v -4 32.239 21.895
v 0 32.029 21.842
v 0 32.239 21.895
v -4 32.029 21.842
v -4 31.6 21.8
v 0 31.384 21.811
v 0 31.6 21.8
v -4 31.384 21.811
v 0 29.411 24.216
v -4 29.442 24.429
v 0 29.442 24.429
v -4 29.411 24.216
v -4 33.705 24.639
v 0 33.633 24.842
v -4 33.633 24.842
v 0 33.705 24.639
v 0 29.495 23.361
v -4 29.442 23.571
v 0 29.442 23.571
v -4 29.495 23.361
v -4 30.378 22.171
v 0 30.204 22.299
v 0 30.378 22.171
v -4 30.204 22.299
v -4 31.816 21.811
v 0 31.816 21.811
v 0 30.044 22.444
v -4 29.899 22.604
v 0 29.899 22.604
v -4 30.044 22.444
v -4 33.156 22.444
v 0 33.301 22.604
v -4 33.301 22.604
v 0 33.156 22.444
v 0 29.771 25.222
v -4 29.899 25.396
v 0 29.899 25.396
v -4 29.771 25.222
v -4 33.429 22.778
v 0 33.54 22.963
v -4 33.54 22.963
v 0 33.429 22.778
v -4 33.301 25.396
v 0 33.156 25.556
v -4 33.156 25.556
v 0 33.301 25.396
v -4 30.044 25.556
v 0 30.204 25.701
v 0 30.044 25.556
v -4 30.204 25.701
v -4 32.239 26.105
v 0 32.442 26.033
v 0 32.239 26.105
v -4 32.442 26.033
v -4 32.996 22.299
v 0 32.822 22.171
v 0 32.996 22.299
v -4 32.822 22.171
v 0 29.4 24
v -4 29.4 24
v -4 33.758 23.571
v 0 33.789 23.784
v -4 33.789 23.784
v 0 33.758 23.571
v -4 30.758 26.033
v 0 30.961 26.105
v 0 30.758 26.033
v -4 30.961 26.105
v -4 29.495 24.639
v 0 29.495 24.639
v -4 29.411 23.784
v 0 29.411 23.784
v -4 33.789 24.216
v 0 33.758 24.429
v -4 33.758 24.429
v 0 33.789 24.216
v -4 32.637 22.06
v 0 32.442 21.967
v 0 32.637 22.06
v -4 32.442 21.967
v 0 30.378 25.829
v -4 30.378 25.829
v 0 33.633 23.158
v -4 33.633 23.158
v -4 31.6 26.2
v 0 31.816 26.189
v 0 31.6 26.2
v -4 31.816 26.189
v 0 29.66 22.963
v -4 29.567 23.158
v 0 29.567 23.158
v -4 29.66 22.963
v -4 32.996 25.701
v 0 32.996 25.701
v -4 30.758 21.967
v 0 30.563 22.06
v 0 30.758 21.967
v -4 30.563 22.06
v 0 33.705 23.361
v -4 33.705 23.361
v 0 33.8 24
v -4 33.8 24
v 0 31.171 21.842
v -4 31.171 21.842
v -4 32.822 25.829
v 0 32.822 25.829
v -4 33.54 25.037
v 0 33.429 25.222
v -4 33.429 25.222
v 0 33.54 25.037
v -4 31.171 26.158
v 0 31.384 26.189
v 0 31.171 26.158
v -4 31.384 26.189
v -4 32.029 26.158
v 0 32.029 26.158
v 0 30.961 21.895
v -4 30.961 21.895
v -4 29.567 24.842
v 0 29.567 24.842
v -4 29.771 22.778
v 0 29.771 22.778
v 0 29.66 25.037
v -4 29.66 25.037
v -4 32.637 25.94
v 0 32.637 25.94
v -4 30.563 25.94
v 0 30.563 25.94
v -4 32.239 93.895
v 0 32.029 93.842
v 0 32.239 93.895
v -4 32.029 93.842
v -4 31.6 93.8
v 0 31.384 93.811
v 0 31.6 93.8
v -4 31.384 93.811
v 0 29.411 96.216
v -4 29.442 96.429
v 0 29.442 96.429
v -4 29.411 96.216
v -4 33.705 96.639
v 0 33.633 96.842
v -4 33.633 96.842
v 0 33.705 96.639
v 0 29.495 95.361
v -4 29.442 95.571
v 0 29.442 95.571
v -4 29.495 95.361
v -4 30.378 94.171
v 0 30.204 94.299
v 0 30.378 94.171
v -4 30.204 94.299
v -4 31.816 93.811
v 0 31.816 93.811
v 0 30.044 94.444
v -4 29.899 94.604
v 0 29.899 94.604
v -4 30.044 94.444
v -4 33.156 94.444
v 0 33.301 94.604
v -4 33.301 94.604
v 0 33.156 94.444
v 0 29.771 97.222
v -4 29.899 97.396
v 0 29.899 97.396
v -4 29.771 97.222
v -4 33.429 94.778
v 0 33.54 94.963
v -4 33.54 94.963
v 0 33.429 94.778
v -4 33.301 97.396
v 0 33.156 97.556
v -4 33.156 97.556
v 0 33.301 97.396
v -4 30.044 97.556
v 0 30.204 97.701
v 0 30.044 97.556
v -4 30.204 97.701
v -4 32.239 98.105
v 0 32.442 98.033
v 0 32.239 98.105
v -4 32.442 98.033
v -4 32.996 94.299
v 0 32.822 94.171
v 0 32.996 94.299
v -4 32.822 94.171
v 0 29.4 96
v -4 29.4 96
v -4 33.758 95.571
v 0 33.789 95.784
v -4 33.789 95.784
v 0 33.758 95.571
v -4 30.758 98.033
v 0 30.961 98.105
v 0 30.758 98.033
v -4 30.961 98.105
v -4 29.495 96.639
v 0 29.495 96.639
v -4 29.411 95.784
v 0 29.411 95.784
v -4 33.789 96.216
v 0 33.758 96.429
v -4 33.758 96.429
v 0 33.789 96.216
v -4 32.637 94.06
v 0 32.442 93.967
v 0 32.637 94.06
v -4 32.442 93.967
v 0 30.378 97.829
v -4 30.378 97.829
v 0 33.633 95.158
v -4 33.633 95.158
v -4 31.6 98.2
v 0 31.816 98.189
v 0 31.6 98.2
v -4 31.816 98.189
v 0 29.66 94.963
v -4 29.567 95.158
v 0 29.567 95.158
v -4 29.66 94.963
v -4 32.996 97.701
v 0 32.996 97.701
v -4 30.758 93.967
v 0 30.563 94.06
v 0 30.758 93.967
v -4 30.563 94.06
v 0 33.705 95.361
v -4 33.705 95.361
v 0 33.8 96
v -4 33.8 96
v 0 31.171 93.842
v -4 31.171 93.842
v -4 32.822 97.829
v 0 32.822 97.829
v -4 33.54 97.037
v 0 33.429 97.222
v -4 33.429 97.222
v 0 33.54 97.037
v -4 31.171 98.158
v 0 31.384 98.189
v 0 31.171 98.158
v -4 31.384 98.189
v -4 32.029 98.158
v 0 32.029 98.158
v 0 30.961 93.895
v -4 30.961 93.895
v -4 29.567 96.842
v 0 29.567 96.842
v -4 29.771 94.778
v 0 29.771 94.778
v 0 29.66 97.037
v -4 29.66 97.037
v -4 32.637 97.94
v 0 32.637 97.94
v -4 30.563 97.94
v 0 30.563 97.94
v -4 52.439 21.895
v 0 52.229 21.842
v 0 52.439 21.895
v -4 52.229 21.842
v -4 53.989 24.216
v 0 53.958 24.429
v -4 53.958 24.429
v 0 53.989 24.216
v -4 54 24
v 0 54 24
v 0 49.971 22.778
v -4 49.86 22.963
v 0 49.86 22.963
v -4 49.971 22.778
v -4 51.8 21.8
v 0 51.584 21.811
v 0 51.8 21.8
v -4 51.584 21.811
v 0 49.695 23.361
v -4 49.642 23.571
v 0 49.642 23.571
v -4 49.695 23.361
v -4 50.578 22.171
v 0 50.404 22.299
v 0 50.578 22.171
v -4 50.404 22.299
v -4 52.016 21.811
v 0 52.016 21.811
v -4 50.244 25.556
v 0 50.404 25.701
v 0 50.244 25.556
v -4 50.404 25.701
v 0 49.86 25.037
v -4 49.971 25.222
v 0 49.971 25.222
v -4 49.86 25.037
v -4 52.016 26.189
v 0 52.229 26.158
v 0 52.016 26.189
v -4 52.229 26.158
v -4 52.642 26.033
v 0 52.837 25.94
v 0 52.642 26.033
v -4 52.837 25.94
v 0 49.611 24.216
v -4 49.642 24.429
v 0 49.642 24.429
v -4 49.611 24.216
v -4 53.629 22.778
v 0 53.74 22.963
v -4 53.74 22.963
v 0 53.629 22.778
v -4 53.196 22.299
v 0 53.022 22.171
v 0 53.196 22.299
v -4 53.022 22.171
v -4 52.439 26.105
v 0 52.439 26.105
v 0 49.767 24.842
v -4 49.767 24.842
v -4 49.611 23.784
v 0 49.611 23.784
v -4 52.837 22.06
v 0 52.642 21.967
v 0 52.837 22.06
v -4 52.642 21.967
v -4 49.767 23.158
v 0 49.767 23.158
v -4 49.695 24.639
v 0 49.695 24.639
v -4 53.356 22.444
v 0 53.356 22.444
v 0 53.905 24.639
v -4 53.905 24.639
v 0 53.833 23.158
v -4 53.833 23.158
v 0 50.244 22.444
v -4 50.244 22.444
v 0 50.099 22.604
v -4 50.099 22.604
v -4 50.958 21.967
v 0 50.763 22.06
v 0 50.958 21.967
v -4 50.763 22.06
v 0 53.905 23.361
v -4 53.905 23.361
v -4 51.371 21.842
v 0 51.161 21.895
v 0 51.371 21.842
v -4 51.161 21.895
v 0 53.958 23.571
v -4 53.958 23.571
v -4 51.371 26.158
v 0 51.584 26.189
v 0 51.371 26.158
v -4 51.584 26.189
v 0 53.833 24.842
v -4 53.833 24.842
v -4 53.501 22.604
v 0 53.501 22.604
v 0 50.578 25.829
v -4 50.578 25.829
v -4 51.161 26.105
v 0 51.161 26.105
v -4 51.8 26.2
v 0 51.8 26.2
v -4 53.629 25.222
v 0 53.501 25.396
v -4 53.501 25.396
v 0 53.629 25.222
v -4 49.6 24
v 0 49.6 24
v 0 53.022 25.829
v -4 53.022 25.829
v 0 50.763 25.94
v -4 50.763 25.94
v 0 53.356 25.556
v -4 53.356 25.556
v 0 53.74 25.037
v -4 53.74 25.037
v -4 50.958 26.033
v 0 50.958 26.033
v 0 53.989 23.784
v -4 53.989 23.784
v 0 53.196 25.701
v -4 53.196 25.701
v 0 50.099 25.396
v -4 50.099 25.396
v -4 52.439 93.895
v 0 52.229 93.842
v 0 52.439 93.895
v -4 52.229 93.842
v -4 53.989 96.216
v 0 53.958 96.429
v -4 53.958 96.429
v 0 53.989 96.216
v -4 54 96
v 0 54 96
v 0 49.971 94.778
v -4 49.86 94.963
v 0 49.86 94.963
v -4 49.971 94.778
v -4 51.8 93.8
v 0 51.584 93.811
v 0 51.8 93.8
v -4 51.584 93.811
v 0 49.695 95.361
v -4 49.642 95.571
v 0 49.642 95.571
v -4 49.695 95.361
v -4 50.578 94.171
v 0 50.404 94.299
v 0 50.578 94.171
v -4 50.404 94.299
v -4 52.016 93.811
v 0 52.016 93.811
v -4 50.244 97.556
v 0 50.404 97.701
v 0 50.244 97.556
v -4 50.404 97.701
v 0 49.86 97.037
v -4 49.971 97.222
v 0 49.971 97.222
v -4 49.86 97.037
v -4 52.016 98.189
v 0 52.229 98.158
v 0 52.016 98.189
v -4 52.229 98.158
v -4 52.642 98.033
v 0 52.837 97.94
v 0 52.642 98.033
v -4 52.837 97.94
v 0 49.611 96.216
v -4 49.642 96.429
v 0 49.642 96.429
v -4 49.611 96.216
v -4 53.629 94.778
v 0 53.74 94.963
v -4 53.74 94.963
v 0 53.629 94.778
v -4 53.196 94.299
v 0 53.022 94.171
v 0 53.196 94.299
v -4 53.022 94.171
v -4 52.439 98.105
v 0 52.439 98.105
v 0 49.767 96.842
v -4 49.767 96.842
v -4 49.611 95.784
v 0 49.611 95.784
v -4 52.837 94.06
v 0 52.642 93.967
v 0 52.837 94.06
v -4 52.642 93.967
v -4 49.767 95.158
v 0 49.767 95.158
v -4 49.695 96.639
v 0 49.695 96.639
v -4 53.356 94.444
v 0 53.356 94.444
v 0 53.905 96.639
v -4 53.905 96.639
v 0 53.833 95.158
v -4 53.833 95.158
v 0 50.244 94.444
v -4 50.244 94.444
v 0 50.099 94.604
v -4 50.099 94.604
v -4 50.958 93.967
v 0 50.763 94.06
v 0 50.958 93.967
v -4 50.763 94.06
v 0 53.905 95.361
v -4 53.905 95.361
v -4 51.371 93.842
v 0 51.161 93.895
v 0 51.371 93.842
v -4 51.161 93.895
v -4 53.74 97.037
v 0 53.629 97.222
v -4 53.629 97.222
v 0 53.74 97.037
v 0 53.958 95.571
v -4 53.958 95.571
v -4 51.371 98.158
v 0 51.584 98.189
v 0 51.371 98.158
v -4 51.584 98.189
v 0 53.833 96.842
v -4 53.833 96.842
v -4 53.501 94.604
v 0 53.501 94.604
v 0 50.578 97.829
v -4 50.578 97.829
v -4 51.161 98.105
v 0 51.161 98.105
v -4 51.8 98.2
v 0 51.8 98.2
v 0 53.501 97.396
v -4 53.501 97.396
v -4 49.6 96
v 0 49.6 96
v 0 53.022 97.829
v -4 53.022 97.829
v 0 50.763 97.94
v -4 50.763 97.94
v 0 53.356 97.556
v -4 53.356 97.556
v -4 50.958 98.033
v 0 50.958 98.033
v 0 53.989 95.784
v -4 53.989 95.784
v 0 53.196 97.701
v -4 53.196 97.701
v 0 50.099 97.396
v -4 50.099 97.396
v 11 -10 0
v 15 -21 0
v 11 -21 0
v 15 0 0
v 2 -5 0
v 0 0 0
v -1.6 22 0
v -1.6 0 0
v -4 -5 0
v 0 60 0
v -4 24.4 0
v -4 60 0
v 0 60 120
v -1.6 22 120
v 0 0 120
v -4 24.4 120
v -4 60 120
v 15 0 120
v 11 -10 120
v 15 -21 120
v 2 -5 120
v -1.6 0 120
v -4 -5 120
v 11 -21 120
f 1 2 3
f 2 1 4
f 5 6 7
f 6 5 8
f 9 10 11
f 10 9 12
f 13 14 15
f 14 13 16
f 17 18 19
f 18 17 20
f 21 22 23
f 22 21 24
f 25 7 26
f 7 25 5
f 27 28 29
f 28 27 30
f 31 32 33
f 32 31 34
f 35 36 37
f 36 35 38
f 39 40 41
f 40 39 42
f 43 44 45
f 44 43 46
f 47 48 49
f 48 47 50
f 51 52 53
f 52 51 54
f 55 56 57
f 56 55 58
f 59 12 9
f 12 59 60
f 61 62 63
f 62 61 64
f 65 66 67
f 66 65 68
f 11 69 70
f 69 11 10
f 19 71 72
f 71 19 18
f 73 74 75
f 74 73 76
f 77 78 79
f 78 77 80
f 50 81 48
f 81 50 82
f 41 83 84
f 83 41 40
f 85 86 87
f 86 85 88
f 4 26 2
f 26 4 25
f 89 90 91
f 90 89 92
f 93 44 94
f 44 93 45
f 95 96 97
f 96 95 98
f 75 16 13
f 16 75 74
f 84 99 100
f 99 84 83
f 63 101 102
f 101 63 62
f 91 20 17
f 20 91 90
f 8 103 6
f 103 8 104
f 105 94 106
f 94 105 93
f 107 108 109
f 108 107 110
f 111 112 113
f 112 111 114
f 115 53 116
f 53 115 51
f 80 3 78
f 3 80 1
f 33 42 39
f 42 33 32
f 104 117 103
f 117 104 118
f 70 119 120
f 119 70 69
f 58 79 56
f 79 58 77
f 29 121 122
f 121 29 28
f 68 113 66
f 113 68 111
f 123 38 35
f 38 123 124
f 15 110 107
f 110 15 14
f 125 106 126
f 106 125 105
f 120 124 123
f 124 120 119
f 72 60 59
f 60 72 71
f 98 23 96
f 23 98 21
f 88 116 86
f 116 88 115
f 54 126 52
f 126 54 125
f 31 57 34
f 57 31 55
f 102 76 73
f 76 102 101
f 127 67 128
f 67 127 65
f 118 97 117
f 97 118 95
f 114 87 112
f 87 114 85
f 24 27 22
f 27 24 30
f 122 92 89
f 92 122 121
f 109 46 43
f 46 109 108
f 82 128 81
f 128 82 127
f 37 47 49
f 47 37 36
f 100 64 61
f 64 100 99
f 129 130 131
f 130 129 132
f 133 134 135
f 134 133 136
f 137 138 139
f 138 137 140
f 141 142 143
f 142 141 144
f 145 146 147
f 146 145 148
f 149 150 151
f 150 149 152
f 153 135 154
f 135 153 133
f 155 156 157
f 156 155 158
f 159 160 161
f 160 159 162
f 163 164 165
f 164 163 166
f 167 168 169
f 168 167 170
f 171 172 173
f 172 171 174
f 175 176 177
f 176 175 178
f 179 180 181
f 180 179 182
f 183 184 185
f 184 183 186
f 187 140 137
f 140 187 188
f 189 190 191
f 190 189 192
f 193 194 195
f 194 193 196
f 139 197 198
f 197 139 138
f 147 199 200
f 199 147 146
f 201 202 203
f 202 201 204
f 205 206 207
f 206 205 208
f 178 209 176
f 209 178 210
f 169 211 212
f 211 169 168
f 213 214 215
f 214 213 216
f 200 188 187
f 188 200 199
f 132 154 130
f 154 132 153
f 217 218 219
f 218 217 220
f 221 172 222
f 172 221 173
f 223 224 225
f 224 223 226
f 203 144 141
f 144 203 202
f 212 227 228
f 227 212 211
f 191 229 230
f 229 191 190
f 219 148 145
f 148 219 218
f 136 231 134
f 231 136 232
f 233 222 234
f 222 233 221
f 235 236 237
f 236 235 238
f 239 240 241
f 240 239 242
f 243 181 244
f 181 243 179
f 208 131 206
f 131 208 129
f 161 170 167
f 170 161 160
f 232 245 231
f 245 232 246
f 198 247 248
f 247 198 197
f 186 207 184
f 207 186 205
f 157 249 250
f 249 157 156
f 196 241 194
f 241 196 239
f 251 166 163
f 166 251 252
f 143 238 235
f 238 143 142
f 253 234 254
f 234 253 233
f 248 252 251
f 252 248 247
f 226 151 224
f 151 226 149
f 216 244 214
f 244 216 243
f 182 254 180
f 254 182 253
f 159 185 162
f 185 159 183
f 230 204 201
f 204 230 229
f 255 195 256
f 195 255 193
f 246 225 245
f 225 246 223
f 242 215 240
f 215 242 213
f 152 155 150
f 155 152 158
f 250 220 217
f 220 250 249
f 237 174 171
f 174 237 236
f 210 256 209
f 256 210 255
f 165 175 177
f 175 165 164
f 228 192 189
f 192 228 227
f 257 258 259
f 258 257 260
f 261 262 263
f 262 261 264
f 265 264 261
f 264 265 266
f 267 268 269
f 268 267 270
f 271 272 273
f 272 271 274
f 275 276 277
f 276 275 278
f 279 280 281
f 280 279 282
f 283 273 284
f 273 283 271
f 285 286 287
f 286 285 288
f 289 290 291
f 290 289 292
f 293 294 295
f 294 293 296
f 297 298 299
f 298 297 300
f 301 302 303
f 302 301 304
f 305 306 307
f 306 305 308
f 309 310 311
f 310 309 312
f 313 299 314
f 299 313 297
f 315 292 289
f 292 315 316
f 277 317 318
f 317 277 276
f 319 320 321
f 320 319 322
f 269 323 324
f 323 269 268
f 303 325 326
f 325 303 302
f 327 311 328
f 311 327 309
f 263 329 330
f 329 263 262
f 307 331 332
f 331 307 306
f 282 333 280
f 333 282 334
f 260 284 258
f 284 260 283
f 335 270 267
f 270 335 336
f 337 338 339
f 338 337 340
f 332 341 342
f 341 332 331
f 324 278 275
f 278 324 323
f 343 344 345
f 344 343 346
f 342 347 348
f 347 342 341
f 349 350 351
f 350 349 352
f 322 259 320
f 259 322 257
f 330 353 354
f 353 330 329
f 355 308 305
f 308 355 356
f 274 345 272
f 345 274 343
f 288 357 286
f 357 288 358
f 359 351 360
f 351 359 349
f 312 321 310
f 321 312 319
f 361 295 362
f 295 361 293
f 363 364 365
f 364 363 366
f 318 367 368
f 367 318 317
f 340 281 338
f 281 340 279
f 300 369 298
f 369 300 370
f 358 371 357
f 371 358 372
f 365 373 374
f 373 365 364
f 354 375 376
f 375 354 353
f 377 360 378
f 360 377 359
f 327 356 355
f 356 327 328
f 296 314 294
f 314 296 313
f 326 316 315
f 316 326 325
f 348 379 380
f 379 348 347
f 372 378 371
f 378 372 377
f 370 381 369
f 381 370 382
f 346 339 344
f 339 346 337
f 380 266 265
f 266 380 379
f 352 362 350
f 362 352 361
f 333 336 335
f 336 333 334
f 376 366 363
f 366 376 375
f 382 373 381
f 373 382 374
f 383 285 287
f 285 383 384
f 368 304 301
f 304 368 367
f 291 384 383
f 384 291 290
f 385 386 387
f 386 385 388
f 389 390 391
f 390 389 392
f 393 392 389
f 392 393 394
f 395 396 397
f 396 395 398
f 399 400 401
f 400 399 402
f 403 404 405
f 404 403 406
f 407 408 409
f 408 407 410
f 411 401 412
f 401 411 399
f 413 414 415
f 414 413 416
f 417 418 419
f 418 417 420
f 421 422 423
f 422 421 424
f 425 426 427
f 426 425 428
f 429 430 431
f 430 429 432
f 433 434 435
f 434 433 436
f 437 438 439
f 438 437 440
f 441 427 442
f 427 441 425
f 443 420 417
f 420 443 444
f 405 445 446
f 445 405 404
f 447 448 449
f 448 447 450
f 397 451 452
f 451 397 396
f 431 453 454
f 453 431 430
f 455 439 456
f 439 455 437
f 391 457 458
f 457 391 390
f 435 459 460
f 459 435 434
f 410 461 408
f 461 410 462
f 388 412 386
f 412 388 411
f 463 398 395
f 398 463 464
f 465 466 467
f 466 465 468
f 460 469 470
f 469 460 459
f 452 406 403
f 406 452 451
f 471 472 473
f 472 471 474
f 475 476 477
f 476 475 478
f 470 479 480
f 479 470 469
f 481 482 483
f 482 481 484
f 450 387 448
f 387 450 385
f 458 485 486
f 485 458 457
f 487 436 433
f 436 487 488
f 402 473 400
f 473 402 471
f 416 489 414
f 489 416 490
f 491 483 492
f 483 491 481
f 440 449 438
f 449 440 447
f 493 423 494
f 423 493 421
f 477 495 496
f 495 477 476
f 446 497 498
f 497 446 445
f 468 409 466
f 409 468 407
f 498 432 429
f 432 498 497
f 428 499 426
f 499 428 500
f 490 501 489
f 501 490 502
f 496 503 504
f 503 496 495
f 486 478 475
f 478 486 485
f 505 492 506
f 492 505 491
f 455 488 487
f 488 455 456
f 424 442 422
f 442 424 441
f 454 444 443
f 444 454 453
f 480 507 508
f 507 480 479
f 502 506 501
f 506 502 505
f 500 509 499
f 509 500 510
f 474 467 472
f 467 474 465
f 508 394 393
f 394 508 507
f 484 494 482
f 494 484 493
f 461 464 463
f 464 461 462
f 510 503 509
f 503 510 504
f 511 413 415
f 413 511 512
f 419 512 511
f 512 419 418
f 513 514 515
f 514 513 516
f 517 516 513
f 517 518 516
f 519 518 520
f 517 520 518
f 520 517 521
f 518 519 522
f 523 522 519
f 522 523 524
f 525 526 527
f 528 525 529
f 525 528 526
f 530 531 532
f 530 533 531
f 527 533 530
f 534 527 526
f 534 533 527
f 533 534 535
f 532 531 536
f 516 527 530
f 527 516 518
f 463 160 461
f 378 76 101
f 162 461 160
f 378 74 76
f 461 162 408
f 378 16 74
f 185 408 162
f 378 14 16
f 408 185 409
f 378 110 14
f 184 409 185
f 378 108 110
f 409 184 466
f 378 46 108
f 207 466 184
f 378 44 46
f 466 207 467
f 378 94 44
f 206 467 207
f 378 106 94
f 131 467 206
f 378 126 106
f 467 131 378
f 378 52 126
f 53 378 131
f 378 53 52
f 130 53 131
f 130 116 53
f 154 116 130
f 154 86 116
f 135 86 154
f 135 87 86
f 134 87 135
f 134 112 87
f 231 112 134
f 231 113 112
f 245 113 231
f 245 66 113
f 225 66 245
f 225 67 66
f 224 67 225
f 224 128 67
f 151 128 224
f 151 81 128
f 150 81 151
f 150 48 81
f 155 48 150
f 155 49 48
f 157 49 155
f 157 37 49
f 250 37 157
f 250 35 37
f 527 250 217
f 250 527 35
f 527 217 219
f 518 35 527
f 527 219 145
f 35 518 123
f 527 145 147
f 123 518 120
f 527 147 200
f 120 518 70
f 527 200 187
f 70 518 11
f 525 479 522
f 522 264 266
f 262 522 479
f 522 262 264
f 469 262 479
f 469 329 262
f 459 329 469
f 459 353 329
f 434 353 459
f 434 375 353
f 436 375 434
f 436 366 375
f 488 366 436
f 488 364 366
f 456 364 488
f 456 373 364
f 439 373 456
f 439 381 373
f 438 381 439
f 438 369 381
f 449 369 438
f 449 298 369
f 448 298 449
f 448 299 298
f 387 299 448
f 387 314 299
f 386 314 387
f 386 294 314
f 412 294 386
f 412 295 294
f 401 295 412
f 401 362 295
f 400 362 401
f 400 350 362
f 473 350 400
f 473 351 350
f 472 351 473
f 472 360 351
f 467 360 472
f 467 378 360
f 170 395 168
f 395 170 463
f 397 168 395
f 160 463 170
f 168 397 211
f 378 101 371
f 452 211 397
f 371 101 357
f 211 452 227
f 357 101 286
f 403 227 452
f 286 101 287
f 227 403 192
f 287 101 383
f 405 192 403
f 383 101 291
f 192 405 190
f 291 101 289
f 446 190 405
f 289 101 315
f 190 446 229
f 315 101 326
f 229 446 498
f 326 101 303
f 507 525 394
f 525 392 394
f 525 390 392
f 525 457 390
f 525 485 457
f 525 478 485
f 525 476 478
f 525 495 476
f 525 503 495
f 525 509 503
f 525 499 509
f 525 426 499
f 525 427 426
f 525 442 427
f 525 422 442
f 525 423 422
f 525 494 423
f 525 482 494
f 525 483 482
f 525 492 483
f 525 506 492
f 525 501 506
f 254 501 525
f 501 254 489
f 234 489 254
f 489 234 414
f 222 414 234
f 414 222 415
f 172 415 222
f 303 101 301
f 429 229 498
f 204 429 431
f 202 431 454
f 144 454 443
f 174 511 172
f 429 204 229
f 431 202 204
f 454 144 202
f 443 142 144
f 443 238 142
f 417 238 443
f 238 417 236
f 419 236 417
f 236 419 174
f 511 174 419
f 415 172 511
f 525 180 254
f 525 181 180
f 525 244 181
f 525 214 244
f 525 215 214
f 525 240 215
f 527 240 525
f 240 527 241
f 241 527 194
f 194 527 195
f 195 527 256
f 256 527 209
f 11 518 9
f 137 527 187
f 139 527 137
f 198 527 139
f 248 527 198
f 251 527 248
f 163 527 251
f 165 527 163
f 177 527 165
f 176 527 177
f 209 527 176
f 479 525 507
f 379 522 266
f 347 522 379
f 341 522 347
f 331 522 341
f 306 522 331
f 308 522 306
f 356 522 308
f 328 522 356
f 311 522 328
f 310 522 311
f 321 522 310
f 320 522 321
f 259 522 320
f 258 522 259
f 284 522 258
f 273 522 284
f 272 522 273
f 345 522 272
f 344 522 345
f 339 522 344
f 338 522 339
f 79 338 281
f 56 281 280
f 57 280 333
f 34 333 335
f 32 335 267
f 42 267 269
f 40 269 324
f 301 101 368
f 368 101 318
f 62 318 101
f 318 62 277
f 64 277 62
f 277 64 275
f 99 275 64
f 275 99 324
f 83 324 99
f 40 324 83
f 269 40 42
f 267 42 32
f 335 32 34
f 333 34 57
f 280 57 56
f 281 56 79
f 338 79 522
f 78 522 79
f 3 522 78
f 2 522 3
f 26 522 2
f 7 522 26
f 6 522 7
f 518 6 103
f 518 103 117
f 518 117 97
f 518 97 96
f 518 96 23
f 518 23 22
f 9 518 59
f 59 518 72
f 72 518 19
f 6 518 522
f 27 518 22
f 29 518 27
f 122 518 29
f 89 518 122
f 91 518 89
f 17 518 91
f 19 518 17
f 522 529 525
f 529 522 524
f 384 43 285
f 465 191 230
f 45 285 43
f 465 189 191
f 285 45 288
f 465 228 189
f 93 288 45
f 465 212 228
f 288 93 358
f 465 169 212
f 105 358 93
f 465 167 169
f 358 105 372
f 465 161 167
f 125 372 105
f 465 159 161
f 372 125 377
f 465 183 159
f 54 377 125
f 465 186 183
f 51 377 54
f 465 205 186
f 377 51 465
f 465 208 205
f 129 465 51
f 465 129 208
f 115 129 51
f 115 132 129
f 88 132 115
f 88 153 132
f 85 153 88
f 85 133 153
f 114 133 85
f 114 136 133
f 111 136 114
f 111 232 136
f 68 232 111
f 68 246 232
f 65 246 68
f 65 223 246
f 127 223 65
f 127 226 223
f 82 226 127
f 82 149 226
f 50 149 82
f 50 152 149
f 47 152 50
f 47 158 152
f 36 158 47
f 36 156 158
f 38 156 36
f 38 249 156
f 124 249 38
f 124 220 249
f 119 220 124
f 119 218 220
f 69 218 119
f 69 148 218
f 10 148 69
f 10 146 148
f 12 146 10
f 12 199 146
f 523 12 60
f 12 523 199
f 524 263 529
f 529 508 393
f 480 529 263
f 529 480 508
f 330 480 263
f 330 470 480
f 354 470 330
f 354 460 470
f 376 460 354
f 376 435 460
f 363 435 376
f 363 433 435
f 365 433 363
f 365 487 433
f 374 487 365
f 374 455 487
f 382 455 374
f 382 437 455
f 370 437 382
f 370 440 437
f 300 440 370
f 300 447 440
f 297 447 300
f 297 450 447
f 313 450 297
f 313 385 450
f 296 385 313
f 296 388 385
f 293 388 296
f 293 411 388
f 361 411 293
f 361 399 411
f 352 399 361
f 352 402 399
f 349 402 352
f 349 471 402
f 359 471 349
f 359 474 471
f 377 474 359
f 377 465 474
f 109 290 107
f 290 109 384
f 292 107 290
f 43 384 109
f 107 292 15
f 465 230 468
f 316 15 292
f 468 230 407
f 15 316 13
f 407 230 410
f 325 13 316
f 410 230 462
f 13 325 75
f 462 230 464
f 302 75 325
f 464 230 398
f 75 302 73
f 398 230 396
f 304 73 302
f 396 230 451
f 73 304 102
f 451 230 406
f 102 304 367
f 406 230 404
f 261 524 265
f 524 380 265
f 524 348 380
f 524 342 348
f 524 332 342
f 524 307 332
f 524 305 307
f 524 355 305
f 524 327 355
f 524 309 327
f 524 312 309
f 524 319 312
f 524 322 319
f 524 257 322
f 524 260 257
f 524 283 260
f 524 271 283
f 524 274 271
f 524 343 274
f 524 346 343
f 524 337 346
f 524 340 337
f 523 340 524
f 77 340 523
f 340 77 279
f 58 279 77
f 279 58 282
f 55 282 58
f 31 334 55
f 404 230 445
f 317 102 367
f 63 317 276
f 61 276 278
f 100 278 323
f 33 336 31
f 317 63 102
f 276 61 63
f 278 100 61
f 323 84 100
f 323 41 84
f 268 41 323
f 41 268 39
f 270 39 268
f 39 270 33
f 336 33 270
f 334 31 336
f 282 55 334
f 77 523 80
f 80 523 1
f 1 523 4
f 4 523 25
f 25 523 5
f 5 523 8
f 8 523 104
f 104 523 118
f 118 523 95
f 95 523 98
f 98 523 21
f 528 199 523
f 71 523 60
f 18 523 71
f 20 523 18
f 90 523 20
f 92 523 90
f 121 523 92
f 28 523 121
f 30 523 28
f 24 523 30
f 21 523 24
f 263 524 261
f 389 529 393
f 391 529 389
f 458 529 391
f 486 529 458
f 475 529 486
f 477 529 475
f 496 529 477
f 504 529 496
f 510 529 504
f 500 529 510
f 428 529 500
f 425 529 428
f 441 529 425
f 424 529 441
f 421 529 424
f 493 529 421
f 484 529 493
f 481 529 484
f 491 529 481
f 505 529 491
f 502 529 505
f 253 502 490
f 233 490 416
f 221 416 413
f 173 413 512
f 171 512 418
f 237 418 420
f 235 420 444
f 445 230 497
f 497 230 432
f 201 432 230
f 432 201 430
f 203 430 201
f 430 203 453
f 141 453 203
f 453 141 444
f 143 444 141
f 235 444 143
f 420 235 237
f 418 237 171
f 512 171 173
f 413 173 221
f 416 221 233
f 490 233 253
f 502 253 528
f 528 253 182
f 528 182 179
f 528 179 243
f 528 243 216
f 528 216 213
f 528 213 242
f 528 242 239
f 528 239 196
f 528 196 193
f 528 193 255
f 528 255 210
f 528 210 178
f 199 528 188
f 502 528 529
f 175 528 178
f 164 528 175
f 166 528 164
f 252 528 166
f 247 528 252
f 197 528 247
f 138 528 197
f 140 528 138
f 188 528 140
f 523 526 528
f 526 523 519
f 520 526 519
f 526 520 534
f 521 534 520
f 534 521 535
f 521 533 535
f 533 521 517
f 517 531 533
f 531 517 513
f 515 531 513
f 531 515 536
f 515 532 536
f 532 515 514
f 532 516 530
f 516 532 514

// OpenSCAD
// =====================================
// Bin Foot Opener
// Toe-operated pull for a pull-out kitchen bin drawer
//
// Coordinate convention: x runs through the panel, x = 0 is the panel's back
// face and +x points out into the room; y is in-use up, y = 0 is the panel's
// bottom edge; extrusion runs along +z = bracket width. A single 2D profile
// is linear_extrude()d along the width, so the exported STL is simultaneously
// print-oriented (every face a vertical wall, no supports) and upright in the
// viewer, the scanning-rig/phone_stand.scad pattern. The toe lip is
// intentionally recessed behind the front face, so base_run must not exceed
// the actual panel thickness.
//
// Two triangular end gussets cannot print without support in this orientation
// (a gusset at one end of the width sits on the bed; its twin at the other
// end is a horizontal island floating in mid-air). A single full-width
// triangular web across the base/lip corner is the printable equivalent: it
// braces the whole transition, costs nothing extra in the extrusion, and
// doubles as a lead-in ramp for the toe.
//
// The fixing plate is relieved over its bottom relief_h mm, where the drawer
// face meets the front edge of the cabinet's bottom panel. That band is the
// only part of the bracket that holds the drawer front proud when closed, so
// it is thinned to relief_t; above it the plate returns to rear_t for
// stiffness and screw purchase. The screws are deliberately NOT countersunk:
// their heads sit on the plate face above the relief band, where nothing in
// the cabinet backs onto them.
// =====================================

$fn = 64;

// ---- Parameters (mm) ----
base_run  = 15;    // base run from the panel's back face; keep <= actual panel thickness
rear_t    = 4;     // fixing plate thickness above the relief band
relief_h  = 22;    // bottom band of the plate that meets the cabinet's bottom
                   // panel; measured up from the panel's bottom edge (0 = none)
relief_t  = 1.6;   // plate thickness inside that band — this is all that holds
                   // the drawer front proud when closed
rear_h    = 60;    // how far the fixing plate rises up the inside face
base_t    = 5;     // thickness of the piece under the panel's bottom edge
lip_t     = 4;     // toe lip thickness
lip_h     = 16;    // how far the toe lip juts down below the base
web_drop  = 5;     // corner web depth down the lip's back face (0 = no web)
width     = 120;   // bracket width along the panel; also the printed height
screw_holes = true; // false = no drilling, bond the plate on with VHB tape

// ---- Fixed (not exposed in the customizer) ----
screw_d = 4.4;      // screw shank clearance diameter
screw_head_d = 8.4; // head diameter — bears on the plate face, no countersink
screw_edge = 9;

// ---- Derived ----
x0 = -rear_t;              // fixing plate outer face
x1 = 0;                     // panel back face
x2 = base_run - lip_t;      // lip back face — the surface the toe catches
x3 = base_run;              // front edge of the recessed base run
yb = -base_t;               // base underside
yl = -base_t - lip_h;       // lip bottom

// Clamped, not asserted: on a thin panel the web is shallower than 2 *
// web_drop implies, which is intended — don't turn this into an assert.
web_run = (web_drop > 0) ? min(2 * web_drop, base_run - lip_t - 2) : 0;
screw_sp  = width * 0.6;

xr = -relief_t;                                              // relieved outer face
relief_top = (relief_h > 0) ? relief_h + rear_t - relief_t : 0;  // top of the 45deg ramp

// Screw rows are derived, not fixed: both must land in the full-thickness
// plate above the relief ramp, and clear the top edge.
screw_y_lo = max(relief_top + screw_head_d / 2 + 3, 20);
screw_y_hi = rear_h - screw_head_d / 2 - 4;

back_face = (relief_h > 0)
    ? [[xr, 0], [xr, relief_h], [x0, relief_top]]
    : [];

assert(rear_t >= 3, "rear_t too thin to hold a screw");
assert(relief_t >= 1.2, "relief_t too thin to print as solid perimeters");
assert(rear_t - relief_t >= 1, "relief_t must be at least 1mm thinner than rear_t");
assert(lip_h - web_drop >= 6, "web_drop leaves too little lip for a toe to catch");
assert(base_run - lip_t - 2 > 0, "lip_t too thick for this base_run");
assert(rear_h - screw_y_hi >= screw_head_d / 2 + 2, "rear_h too short for the top screw row");
assert(screw_y_lo - screw_head_d / 2 >= relief_top + 1.5, "lower screw row would overhang the relief ramp");
assert(screw_y_hi - screw_y_lo >= screw_head_d + 2, "screw rows too close together");
assert((width - screw_sp) / 2 >= screw_head_d / 2 + 3, "screws too close to the ends");
assert(base_t >= 3, "base_t too thin to carry a foot load");

module profile() {
    polygon(points = concat([
        [x0, rear_h],
        [x1, rear_h],
        [x1, 0],
        [x3, 0],
        [x3, yl],
        [x2, yl],
        [x2, yb - web_drop],
        [x2 - web_run, yb],
        [x0, yb],
    ], back_face));
}

module screw_cuts() {
    for (cy = [screw_y_lo, screw_y_hi]) {
        for (s = [-1, 1]) {
            let (cz = width / 2 + s * screw_sp / 2) {
                // Shank only. The heads are not countersunk: they sit proud on
                // the x0 face above the relief band, where no cabinet material
                // backs onto them.
                translate([x0 - 1, cy, cz])
                    rotate([0, 90, 0])
                        cylinder(d = screw_d, h = rear_t + 2);
            }
        }
    }
}

module bin_foot_pull() {
    difference() {
        linear_extrude(height = width, convexity = 4)
            profile();
        if (screw_holes)
            screw_cuts();
    }
}

bin_foot_pull();
